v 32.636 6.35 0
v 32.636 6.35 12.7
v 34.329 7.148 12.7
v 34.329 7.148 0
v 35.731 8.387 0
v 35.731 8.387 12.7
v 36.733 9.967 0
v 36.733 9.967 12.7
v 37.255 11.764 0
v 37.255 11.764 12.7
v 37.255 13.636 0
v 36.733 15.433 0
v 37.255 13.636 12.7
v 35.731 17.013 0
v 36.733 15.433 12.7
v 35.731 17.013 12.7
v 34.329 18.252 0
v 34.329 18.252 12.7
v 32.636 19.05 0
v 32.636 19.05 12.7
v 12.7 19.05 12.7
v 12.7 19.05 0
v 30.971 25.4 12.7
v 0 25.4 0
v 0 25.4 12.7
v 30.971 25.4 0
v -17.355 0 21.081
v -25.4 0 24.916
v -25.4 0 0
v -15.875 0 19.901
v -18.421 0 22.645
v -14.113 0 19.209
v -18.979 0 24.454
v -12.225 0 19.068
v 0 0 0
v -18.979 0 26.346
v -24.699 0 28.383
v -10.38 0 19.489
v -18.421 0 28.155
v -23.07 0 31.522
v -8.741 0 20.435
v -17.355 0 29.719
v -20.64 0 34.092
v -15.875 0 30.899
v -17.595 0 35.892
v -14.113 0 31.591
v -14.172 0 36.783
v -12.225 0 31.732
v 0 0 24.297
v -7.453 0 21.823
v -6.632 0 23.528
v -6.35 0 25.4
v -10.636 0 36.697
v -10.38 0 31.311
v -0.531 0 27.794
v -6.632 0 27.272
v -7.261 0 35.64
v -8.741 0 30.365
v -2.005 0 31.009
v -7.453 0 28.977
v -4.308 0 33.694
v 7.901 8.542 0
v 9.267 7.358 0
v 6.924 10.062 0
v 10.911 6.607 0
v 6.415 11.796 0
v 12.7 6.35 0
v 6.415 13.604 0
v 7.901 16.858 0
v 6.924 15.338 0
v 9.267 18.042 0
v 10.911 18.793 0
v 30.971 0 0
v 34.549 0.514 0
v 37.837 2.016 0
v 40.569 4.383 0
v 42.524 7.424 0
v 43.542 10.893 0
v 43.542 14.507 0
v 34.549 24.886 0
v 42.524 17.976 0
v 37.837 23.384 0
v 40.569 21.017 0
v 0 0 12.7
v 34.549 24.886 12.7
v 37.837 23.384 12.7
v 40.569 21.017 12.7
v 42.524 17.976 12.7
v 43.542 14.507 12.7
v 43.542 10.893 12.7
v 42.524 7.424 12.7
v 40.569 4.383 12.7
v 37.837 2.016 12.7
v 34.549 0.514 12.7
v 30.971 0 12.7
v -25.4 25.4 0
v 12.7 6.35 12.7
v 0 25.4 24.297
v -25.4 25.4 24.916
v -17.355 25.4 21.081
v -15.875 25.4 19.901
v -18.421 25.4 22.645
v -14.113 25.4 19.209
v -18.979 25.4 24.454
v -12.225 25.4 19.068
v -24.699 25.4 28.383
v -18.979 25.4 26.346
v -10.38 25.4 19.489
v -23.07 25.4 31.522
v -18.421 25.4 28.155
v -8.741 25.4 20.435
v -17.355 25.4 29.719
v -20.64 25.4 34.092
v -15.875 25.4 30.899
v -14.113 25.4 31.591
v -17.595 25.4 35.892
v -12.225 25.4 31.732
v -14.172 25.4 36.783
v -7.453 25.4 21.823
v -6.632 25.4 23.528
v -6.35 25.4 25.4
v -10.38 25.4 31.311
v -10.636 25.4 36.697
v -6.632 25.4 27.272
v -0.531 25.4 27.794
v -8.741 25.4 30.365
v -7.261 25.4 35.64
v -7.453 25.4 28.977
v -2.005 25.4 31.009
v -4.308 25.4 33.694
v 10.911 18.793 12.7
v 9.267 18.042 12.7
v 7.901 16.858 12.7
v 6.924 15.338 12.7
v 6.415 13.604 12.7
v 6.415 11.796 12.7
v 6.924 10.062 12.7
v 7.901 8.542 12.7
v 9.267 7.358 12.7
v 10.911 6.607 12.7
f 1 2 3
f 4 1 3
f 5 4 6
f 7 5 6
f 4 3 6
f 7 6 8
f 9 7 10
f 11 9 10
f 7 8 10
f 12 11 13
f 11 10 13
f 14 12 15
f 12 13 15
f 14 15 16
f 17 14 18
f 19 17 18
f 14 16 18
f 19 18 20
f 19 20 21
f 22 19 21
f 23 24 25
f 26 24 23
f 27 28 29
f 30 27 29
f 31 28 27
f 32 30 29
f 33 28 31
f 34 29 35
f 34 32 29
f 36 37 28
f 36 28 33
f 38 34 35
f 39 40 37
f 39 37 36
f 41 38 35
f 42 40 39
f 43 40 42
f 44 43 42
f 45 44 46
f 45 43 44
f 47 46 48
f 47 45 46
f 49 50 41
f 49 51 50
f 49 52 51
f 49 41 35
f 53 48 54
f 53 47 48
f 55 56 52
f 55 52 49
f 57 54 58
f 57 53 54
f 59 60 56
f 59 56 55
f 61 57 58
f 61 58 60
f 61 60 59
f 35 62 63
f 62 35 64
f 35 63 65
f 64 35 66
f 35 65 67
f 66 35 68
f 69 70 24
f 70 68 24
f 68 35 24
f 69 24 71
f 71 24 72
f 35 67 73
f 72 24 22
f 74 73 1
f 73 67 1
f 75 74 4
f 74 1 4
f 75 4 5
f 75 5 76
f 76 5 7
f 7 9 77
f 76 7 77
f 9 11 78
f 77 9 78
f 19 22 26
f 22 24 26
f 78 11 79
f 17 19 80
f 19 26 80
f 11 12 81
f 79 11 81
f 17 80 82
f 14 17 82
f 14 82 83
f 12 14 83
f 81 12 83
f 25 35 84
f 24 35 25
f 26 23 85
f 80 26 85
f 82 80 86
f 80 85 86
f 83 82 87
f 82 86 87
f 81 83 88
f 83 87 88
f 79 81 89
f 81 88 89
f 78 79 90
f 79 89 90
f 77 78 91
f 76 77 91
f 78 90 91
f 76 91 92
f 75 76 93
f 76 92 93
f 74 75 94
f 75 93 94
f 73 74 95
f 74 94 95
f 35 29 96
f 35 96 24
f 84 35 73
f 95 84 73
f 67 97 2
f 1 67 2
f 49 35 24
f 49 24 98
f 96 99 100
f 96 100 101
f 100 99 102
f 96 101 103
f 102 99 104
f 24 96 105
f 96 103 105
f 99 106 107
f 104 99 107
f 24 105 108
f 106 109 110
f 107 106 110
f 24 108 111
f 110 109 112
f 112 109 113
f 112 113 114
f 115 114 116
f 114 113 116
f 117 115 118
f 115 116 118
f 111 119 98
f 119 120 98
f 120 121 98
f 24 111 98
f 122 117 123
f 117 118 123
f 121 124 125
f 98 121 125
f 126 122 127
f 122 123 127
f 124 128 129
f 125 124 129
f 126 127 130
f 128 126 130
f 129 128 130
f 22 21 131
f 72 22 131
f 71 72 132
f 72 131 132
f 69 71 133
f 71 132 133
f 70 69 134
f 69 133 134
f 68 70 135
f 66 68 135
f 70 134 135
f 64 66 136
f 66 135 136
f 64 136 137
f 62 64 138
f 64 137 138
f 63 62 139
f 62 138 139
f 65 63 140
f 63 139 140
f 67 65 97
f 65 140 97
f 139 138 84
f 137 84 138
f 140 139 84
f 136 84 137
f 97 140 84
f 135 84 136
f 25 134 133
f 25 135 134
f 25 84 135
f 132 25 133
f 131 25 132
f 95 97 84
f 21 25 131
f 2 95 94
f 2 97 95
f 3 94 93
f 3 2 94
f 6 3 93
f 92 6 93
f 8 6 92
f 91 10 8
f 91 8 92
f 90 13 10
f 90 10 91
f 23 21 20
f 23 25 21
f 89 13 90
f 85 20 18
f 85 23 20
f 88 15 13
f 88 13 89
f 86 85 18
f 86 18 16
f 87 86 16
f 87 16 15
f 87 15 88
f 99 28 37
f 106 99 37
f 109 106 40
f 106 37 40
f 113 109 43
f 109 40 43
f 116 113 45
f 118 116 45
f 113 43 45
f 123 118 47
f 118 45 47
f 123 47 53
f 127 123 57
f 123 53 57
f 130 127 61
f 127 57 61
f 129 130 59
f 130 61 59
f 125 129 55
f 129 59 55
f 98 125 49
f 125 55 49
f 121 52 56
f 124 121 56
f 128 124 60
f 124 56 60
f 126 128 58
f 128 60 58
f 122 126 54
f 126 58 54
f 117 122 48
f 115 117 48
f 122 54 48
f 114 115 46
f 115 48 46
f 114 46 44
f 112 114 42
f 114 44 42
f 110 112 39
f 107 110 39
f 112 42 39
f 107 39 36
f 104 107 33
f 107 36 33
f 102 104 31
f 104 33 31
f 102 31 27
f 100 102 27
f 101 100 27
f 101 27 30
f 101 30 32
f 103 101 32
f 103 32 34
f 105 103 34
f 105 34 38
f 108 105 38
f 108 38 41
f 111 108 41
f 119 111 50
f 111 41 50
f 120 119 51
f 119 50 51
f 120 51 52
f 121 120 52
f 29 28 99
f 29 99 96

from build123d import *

# Parameters (mm, degrees)
F0_W      = 44.45
F0_H      = 25.4
F1_DEPTH  = 12.7
F3_DEPTH  = 12.7
F5_DEPTH  = 25.4
F7_DEPTH  = 38.1
F8_R      = 6.35
F9_DEPTH  = 25.4
F11_DEPTH = 25.4


with BuildPart() as f1:
    # F0 (on Top) → F1 (new body)
    with BuildSketch(Plane.XY):
        with Locations((22.225, 12.7)):
            Rectangle(F0_W, F0_H)
    extrude(amount=F1_DEPTH)

    # F2 (on face) → F3 (cut)
    with BuildSketch(Plane.XY.offset(12.7)):
        with BuildLine():
            ThreePointArc((30.971239947, 25.4), (43.6712407327, 12.7000003929), (30.9712407327, 0))
            Line((30.9712407327, 0), (44.45, 0))
            Line((44.45, 0), (44.45, 25.4))
            Line((44.45, 25.4), (30.971239947, 25.4))
        make_face()
    extrude(amount=-F3_DEPTH, mode=Mode.SUBTRACT)

    # F4 (on face) → F5 (join)
    with BuildSketch(Plane.XY.offset(12.7)):
        with BuildLine():
            Line((32.6362041169, 19.05), (12.7, 19.05))
            ThreePointArc((12.7, 19.05), (6.35, 12.7), (12.7, 6.35))
            Line((12.7, 6.35), (32.6362041169, 6.35))
            ThreePointArc((32.6362041169, 6.35), (37.3212407327, 12.7), (32.6362041169, 19.05))
        make_face()
    extrude(amount=F5_DEPTH)

    # F6 (on face) → F7 (cut)
    with BuildSketch(Plane.XY.offset(38.1)):
        with BuildLine():
            Line((12.7, 6.35), (32.6362041169, 6.35))
            ThreePointArc((32.6362041169, 6.35), (37.3212407327, 12.7), (32.6362041169, 19.05))
            Line((32.6362041169, 19.05), (12.7, 19.05))
            ThreePointArc((12.7, 19.05), (6.35, 12.7), (12.7, 6.35))
        make_face()
    extrude(amount=-F7_DEPTH, mode=Mode.SUBTRACT)


with BuildPart() as f9:
    # F8 (on face) → F9 (new body)
    with BuildSketch(Plane.XZ):
        with BuildLine():
            ThreePointArc((-25.4, 25.4), (-12.7, 37.5597154701), (0, 25.4))
            Line((0, 25.4), (0, 38.1))
            Line((0, 38.1), (-25.4, 38.1))
            Line((-25.4, 38.1), (-25.4, 25.4))
        make_face()
        with BuildLine():
            Line((-25.4, 0), (0, 0))
            Line((0, 0), (0, 12.7))
            Line((0, 12.7), (0, 25.4))
            ThreePointArc((0, 25.4), (-12.7, 37.5597154701), (-25.4, 25.4))
            Line((-25.4, 25.4), (-25.4, 0))
        make_face()
        with Locations((-12.7, 25.4)):
            Circle(F8_R, mode=Mode.SUBTRACT)
    extrude(amount=-F9_DEPTH)

    # F10 (on face) → F11 (cut)
    with BuildSketch(Plane.XZ):
        with BuildLine():
            ThreePointArc((-25.4, 24.91607517), (-12.4012801532, 36.8635460854), (0, 24.2970418185))
            Line((0, 24.2970418185), (0, 38.1))
            Line((0, 38.1), (-25.4, 38.1))
            Line((-25.4, 38.1), (-25.4, 24.91607517))
        make_face()
    extrude(amount=-F11_DEPTH, mode=Mode.SUBTRACT)


solid = Compound([f1.part, f9.part])
